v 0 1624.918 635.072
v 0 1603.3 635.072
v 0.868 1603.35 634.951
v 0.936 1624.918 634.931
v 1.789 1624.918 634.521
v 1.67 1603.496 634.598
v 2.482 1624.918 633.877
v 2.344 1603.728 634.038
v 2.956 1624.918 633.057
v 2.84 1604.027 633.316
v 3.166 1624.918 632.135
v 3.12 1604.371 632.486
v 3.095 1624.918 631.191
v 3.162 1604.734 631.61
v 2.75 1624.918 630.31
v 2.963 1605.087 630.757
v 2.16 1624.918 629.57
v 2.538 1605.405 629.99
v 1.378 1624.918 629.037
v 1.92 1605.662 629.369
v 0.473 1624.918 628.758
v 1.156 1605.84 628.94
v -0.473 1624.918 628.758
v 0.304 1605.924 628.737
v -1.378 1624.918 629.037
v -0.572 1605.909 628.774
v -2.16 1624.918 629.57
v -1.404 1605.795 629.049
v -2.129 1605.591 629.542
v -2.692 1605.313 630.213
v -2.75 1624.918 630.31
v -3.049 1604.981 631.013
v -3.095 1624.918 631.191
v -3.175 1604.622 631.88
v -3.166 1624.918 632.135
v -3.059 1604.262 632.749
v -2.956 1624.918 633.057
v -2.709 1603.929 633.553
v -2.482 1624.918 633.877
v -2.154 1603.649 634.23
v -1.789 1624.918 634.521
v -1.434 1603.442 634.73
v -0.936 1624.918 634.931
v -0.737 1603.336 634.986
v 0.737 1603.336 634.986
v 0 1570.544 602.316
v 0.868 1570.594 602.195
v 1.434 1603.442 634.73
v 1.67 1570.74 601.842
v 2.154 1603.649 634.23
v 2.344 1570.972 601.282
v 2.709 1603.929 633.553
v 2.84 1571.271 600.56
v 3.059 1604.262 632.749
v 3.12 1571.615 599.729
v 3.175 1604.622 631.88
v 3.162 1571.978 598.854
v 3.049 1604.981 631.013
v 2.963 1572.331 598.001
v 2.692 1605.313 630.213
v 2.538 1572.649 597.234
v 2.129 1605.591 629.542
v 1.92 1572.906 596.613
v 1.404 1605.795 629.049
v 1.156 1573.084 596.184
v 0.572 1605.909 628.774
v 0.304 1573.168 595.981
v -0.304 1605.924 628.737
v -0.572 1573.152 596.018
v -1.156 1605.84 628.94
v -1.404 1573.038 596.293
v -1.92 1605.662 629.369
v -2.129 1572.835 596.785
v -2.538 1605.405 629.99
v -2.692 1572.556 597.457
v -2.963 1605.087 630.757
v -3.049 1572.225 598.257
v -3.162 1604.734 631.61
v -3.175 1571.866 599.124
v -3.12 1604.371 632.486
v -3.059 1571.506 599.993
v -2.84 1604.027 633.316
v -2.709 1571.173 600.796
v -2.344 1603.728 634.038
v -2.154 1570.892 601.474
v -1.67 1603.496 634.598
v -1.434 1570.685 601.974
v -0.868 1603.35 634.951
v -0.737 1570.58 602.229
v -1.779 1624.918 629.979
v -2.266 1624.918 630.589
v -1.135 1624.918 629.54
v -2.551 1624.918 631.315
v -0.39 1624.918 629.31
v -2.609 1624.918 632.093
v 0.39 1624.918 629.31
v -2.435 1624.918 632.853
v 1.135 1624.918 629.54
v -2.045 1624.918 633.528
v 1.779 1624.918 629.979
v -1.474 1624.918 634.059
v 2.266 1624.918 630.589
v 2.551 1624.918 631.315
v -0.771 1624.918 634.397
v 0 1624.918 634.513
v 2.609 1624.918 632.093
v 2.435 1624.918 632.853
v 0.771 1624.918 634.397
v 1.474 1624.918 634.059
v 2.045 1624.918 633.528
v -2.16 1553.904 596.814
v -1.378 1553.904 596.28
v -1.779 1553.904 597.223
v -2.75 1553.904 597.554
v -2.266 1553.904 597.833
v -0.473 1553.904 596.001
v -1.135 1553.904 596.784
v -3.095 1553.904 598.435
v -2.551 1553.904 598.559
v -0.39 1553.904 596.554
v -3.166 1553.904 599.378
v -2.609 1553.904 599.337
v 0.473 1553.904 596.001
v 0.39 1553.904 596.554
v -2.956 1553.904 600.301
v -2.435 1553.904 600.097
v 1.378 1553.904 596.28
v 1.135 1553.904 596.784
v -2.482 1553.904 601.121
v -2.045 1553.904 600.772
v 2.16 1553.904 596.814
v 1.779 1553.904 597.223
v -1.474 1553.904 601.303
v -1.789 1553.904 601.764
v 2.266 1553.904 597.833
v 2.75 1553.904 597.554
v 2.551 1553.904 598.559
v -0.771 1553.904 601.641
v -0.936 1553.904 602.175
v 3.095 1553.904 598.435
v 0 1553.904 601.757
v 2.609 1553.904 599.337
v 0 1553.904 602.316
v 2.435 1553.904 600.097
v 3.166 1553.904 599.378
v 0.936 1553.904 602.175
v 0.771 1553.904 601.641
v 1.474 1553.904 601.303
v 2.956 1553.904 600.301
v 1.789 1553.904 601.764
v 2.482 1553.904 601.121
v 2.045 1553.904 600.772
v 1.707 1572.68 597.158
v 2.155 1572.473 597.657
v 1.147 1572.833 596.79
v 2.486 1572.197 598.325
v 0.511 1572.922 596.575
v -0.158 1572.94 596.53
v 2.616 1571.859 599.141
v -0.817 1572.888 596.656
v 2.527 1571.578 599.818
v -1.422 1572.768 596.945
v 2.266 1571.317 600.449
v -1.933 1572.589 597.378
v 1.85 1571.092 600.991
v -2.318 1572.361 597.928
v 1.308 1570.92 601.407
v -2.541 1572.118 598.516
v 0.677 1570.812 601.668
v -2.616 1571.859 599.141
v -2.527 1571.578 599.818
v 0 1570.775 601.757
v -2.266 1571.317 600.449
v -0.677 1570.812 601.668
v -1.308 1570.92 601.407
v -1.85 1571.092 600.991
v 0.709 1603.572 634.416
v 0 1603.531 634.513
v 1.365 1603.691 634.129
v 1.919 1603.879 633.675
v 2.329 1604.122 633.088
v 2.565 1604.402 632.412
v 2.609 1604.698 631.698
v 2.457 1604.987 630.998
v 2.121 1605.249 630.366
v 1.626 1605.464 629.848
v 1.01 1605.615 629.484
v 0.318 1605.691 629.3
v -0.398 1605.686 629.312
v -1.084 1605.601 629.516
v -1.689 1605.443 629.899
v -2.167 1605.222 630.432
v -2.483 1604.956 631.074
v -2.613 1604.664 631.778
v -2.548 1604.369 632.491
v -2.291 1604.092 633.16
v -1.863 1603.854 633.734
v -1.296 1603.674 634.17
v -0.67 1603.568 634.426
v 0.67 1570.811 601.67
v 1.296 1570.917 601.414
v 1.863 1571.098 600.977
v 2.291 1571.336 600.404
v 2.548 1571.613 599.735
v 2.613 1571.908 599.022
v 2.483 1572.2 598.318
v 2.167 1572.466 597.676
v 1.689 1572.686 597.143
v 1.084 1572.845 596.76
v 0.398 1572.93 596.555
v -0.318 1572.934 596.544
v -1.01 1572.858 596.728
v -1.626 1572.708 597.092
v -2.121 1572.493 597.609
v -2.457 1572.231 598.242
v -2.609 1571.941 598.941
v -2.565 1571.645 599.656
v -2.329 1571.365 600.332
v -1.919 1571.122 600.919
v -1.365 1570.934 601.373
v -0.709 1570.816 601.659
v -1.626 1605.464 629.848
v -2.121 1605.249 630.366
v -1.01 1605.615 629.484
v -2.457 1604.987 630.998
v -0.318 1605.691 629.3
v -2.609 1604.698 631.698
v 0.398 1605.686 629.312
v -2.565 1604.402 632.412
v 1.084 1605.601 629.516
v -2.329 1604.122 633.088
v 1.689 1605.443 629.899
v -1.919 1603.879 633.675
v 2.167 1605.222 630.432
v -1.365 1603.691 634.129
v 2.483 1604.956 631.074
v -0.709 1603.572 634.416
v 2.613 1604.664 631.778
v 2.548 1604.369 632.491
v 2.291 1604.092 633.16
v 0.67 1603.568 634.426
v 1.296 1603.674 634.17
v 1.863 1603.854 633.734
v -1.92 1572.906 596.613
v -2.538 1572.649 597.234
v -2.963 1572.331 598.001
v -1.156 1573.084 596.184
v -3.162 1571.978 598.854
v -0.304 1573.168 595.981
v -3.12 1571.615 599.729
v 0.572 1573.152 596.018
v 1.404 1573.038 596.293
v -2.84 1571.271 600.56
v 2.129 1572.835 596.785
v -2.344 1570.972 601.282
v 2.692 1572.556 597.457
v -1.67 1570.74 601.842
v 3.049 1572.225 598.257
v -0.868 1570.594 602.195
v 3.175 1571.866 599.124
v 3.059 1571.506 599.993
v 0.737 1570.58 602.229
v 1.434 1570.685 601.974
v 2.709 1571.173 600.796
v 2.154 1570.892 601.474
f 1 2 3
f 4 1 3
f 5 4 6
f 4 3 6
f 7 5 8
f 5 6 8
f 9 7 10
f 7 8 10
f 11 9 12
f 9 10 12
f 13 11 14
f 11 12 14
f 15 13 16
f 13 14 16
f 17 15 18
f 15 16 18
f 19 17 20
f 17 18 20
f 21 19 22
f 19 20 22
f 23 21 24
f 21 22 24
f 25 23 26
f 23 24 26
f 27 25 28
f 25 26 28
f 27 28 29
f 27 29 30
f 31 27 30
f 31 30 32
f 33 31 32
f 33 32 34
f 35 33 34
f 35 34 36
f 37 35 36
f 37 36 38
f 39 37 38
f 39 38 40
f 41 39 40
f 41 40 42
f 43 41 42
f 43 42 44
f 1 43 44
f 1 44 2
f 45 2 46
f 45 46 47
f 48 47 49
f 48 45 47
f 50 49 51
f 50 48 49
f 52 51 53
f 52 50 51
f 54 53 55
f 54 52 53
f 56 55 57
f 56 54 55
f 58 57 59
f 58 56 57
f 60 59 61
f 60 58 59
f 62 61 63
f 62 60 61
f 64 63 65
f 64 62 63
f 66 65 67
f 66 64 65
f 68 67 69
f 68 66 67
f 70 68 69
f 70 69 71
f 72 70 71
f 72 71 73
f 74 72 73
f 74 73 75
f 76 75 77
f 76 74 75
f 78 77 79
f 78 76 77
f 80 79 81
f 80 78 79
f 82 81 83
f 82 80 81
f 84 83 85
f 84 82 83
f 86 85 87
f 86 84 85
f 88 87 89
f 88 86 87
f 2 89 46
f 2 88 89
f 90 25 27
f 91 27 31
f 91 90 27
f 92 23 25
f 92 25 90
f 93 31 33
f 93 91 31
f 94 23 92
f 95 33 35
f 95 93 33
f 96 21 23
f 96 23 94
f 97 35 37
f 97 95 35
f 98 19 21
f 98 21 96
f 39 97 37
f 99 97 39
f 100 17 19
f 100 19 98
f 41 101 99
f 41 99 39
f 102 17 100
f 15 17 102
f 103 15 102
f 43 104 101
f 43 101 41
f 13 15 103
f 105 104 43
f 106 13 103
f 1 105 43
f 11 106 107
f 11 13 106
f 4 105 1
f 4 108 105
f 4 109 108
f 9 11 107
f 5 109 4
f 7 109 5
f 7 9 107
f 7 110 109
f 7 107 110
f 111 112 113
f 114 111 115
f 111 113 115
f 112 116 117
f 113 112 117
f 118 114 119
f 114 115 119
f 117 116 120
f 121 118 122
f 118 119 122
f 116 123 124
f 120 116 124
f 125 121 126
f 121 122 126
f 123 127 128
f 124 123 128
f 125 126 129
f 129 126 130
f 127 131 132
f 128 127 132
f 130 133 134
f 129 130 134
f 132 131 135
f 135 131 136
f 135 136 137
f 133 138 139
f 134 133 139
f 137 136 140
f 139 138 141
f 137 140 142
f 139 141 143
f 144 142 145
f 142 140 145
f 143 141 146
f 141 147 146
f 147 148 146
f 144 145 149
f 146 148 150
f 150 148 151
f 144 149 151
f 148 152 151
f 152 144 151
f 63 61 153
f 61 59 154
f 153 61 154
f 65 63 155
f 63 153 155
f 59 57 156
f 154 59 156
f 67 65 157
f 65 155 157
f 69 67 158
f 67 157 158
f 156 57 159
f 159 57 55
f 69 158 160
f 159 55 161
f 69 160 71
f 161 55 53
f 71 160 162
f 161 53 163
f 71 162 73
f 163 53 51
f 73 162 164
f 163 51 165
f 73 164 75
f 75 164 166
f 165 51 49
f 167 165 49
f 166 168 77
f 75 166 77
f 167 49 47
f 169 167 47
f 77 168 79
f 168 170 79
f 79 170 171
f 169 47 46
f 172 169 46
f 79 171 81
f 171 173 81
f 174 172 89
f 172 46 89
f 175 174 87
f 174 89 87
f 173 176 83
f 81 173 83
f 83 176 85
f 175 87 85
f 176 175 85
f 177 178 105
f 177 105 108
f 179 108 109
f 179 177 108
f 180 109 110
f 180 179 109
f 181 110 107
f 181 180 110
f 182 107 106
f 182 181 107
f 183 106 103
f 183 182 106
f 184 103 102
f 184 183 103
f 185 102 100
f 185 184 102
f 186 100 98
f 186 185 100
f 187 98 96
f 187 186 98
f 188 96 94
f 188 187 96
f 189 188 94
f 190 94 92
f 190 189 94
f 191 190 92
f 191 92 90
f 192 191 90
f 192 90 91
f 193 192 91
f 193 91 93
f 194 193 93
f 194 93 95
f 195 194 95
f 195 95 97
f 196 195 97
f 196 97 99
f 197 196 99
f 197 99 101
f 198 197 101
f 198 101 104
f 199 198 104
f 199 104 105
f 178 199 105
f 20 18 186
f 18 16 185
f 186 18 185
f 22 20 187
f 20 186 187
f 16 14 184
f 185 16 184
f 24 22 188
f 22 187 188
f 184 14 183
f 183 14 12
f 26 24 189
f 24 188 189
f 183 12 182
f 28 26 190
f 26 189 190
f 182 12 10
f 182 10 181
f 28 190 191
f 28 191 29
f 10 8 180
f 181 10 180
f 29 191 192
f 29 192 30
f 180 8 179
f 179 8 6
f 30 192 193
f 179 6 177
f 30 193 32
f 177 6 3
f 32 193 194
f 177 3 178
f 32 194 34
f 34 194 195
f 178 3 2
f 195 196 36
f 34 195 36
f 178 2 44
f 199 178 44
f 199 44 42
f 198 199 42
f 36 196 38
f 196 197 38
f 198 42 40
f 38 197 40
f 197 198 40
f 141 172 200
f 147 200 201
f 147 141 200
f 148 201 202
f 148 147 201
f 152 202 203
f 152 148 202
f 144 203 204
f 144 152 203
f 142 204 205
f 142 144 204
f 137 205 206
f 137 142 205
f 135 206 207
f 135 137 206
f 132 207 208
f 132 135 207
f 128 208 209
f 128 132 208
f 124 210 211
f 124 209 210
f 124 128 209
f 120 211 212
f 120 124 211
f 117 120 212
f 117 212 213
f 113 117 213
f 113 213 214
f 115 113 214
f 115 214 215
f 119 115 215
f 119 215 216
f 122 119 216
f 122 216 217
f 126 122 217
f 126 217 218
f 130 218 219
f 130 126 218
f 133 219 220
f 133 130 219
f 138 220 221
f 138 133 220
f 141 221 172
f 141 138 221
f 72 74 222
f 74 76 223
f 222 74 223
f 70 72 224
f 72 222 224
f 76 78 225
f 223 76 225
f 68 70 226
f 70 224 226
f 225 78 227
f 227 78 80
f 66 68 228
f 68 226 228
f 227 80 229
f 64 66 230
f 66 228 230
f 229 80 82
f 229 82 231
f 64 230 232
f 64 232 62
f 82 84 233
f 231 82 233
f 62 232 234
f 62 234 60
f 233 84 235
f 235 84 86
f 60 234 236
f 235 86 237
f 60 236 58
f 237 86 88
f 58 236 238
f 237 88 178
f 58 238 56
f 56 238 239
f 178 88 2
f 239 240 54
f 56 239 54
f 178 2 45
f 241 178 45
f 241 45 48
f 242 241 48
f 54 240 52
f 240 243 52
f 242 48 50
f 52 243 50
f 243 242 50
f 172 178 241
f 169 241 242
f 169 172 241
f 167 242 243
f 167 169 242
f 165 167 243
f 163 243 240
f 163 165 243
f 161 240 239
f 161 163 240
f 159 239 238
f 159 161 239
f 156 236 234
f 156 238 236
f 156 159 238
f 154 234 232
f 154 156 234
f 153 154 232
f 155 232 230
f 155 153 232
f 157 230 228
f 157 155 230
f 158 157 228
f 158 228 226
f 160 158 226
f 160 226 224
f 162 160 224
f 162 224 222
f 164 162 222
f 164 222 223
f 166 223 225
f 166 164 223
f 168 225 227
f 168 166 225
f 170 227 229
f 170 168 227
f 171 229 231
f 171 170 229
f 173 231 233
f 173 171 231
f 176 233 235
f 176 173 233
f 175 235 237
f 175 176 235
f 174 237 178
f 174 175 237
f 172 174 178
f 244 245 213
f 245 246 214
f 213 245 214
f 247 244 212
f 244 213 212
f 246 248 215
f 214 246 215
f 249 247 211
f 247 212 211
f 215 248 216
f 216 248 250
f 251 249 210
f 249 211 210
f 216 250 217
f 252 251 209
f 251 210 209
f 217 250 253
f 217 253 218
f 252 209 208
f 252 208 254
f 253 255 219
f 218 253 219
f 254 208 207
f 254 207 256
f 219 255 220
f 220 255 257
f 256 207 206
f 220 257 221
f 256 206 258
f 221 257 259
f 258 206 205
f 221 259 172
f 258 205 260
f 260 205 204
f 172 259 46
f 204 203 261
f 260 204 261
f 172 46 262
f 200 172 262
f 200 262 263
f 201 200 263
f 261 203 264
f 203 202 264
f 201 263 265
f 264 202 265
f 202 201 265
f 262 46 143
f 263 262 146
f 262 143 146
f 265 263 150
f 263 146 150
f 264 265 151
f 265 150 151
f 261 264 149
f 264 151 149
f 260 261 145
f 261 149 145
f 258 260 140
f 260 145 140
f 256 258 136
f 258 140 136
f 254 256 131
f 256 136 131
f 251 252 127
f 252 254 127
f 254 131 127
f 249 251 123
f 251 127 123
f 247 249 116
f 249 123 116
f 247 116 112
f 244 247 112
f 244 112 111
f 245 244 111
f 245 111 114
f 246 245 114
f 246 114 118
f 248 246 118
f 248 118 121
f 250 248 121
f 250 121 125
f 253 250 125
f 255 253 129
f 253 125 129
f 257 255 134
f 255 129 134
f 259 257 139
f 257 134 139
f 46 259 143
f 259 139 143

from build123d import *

# Parameters (mm, degrees)
SKETCH11_ON_SEGMENT_1_R        = 3.175
SKETCH11_ON_SEGMENT_1_R_2      = 2.6162
PIPE_0_5_SCH_40_1_DEPTH        = 20.815092915
SKETCH11_R                     = 3.175
SKETCH11_R_2                   = 2.6162
PIPE_0_5_SCH_40_1_2_DEPTH      = 49.184193112
PIPE_0_5_SCH_40_1_2_DEPTH_BACK = 2.859871939
SKETCH11_ON_SEGMENT_3_R        = 3.175
SKETCH11_ON_SEGMENT_3_R_2      = 2.6162
PIPE_0_5_SCH_40_1_3_DEPTH      = 23.163130032


with BuildPart() as part:
    # Sketch11 on segment 1 (carried to segment 1) → Pipe 0.5 SCH 40(1) (new body)
    with BuildSketch(Plane(origin=(0, 1553.903542435, 599.141033205), x_dir=(0, 0, 1), z_dir=(0, 1, 0))):
        Circle(SKETCH11_ON_SEGMENT_1_R)
        Circle(SKETCH11_ON_SEGMENT_1_R_2, mode=Mode.SUBTRACT)
    extrude(amount=PIPE_0_5_SCH_40_1_DEPTH)

    # Pipe 0.5 SCH 40(1) mitre 1
    split(bisect_by=Plane(origin=(0, 1571.858763411, 599.141033205), x_dir=(1, 0, 0), z_dir=(0, -0.923879533, -0.382683432)), keep=Keep.TOP)


with BuildPart() as body_2:
    # Sketch11 → Pipe 0.5 SCH 40_1 2 (new, two sides)
    with BuildSketch(Plane(origin=(0, 1571.858763411, 599.141033205), x_dir=(0, -0.7071067811865476, 0.7071067811865476), z_dir=(0, 0.7071067811865476, 0.7071067811865476))) as pipe_0_5_sch_40_1_2_sk:
        Circle(SKETCH11_R)
        Circle(SKETCH11_R_2, mode=Mode.SUBTRACT)
    extrude(amount=PIPE_0_5_SCH_40_1_2_DEPTH)
    extrude(pipe_0_5_sch_40_1_2_sk.sketch, amount=-PIPE_0_5_SCH_40_1_2_DEPTH_BACK)

    # Pipe 0.5 SCH 40_1 2 mitre 1
    split(bisect_by=Plane(origin=(0, 1571.858763411, 599.141033205), x_dir=(-1, 0, 0), z_dir=(0, 0.923879533, 0.382683432)), keep=Keep.TOP)

    # Pipe 0.5 SCH 40_1 2 mitre 2
    split(bisect_by=Plane(origin=(0, 1604.615005046, 631.89727484), x_dir=(1, 0, 0), z_dir=(0, -0.923879533, -0.382683432)), keep=Keep.TOP)


with BuildPart() as body_3:
    # Sketch11 on segment 3 (carried to segment 3) → Pipe 0.5 SCH 40_1 3 (new body)
    with BuildSketch(Plane(origin=(0, 1601.755133106, 631.89727484), x_dir=(0, 0, 1), z_dir=(0, 1, 0))):
        Circle(SKETCH11_ON_SEGMENT_3_R)
        Circle(SKETCH11_ON_SEGMENT_3_R_2, mode=Mode.SUBTRACT)
    extrude(amount=PIPE_0_5_SCH_40_1_3_DEPTH)

    # Pipe 0.5 SCH 40_1 3 mitre 1
    split(bisect_by=Plane(origin=(0, 1604.615005046, 631.89727484), x_dir=(-1, 0, 0), z_dir=(0, 0.923879533, 0.382683432)), keep=Keep.TOP)


solid = Compound([part.part, body_2.part, body_3.part])
